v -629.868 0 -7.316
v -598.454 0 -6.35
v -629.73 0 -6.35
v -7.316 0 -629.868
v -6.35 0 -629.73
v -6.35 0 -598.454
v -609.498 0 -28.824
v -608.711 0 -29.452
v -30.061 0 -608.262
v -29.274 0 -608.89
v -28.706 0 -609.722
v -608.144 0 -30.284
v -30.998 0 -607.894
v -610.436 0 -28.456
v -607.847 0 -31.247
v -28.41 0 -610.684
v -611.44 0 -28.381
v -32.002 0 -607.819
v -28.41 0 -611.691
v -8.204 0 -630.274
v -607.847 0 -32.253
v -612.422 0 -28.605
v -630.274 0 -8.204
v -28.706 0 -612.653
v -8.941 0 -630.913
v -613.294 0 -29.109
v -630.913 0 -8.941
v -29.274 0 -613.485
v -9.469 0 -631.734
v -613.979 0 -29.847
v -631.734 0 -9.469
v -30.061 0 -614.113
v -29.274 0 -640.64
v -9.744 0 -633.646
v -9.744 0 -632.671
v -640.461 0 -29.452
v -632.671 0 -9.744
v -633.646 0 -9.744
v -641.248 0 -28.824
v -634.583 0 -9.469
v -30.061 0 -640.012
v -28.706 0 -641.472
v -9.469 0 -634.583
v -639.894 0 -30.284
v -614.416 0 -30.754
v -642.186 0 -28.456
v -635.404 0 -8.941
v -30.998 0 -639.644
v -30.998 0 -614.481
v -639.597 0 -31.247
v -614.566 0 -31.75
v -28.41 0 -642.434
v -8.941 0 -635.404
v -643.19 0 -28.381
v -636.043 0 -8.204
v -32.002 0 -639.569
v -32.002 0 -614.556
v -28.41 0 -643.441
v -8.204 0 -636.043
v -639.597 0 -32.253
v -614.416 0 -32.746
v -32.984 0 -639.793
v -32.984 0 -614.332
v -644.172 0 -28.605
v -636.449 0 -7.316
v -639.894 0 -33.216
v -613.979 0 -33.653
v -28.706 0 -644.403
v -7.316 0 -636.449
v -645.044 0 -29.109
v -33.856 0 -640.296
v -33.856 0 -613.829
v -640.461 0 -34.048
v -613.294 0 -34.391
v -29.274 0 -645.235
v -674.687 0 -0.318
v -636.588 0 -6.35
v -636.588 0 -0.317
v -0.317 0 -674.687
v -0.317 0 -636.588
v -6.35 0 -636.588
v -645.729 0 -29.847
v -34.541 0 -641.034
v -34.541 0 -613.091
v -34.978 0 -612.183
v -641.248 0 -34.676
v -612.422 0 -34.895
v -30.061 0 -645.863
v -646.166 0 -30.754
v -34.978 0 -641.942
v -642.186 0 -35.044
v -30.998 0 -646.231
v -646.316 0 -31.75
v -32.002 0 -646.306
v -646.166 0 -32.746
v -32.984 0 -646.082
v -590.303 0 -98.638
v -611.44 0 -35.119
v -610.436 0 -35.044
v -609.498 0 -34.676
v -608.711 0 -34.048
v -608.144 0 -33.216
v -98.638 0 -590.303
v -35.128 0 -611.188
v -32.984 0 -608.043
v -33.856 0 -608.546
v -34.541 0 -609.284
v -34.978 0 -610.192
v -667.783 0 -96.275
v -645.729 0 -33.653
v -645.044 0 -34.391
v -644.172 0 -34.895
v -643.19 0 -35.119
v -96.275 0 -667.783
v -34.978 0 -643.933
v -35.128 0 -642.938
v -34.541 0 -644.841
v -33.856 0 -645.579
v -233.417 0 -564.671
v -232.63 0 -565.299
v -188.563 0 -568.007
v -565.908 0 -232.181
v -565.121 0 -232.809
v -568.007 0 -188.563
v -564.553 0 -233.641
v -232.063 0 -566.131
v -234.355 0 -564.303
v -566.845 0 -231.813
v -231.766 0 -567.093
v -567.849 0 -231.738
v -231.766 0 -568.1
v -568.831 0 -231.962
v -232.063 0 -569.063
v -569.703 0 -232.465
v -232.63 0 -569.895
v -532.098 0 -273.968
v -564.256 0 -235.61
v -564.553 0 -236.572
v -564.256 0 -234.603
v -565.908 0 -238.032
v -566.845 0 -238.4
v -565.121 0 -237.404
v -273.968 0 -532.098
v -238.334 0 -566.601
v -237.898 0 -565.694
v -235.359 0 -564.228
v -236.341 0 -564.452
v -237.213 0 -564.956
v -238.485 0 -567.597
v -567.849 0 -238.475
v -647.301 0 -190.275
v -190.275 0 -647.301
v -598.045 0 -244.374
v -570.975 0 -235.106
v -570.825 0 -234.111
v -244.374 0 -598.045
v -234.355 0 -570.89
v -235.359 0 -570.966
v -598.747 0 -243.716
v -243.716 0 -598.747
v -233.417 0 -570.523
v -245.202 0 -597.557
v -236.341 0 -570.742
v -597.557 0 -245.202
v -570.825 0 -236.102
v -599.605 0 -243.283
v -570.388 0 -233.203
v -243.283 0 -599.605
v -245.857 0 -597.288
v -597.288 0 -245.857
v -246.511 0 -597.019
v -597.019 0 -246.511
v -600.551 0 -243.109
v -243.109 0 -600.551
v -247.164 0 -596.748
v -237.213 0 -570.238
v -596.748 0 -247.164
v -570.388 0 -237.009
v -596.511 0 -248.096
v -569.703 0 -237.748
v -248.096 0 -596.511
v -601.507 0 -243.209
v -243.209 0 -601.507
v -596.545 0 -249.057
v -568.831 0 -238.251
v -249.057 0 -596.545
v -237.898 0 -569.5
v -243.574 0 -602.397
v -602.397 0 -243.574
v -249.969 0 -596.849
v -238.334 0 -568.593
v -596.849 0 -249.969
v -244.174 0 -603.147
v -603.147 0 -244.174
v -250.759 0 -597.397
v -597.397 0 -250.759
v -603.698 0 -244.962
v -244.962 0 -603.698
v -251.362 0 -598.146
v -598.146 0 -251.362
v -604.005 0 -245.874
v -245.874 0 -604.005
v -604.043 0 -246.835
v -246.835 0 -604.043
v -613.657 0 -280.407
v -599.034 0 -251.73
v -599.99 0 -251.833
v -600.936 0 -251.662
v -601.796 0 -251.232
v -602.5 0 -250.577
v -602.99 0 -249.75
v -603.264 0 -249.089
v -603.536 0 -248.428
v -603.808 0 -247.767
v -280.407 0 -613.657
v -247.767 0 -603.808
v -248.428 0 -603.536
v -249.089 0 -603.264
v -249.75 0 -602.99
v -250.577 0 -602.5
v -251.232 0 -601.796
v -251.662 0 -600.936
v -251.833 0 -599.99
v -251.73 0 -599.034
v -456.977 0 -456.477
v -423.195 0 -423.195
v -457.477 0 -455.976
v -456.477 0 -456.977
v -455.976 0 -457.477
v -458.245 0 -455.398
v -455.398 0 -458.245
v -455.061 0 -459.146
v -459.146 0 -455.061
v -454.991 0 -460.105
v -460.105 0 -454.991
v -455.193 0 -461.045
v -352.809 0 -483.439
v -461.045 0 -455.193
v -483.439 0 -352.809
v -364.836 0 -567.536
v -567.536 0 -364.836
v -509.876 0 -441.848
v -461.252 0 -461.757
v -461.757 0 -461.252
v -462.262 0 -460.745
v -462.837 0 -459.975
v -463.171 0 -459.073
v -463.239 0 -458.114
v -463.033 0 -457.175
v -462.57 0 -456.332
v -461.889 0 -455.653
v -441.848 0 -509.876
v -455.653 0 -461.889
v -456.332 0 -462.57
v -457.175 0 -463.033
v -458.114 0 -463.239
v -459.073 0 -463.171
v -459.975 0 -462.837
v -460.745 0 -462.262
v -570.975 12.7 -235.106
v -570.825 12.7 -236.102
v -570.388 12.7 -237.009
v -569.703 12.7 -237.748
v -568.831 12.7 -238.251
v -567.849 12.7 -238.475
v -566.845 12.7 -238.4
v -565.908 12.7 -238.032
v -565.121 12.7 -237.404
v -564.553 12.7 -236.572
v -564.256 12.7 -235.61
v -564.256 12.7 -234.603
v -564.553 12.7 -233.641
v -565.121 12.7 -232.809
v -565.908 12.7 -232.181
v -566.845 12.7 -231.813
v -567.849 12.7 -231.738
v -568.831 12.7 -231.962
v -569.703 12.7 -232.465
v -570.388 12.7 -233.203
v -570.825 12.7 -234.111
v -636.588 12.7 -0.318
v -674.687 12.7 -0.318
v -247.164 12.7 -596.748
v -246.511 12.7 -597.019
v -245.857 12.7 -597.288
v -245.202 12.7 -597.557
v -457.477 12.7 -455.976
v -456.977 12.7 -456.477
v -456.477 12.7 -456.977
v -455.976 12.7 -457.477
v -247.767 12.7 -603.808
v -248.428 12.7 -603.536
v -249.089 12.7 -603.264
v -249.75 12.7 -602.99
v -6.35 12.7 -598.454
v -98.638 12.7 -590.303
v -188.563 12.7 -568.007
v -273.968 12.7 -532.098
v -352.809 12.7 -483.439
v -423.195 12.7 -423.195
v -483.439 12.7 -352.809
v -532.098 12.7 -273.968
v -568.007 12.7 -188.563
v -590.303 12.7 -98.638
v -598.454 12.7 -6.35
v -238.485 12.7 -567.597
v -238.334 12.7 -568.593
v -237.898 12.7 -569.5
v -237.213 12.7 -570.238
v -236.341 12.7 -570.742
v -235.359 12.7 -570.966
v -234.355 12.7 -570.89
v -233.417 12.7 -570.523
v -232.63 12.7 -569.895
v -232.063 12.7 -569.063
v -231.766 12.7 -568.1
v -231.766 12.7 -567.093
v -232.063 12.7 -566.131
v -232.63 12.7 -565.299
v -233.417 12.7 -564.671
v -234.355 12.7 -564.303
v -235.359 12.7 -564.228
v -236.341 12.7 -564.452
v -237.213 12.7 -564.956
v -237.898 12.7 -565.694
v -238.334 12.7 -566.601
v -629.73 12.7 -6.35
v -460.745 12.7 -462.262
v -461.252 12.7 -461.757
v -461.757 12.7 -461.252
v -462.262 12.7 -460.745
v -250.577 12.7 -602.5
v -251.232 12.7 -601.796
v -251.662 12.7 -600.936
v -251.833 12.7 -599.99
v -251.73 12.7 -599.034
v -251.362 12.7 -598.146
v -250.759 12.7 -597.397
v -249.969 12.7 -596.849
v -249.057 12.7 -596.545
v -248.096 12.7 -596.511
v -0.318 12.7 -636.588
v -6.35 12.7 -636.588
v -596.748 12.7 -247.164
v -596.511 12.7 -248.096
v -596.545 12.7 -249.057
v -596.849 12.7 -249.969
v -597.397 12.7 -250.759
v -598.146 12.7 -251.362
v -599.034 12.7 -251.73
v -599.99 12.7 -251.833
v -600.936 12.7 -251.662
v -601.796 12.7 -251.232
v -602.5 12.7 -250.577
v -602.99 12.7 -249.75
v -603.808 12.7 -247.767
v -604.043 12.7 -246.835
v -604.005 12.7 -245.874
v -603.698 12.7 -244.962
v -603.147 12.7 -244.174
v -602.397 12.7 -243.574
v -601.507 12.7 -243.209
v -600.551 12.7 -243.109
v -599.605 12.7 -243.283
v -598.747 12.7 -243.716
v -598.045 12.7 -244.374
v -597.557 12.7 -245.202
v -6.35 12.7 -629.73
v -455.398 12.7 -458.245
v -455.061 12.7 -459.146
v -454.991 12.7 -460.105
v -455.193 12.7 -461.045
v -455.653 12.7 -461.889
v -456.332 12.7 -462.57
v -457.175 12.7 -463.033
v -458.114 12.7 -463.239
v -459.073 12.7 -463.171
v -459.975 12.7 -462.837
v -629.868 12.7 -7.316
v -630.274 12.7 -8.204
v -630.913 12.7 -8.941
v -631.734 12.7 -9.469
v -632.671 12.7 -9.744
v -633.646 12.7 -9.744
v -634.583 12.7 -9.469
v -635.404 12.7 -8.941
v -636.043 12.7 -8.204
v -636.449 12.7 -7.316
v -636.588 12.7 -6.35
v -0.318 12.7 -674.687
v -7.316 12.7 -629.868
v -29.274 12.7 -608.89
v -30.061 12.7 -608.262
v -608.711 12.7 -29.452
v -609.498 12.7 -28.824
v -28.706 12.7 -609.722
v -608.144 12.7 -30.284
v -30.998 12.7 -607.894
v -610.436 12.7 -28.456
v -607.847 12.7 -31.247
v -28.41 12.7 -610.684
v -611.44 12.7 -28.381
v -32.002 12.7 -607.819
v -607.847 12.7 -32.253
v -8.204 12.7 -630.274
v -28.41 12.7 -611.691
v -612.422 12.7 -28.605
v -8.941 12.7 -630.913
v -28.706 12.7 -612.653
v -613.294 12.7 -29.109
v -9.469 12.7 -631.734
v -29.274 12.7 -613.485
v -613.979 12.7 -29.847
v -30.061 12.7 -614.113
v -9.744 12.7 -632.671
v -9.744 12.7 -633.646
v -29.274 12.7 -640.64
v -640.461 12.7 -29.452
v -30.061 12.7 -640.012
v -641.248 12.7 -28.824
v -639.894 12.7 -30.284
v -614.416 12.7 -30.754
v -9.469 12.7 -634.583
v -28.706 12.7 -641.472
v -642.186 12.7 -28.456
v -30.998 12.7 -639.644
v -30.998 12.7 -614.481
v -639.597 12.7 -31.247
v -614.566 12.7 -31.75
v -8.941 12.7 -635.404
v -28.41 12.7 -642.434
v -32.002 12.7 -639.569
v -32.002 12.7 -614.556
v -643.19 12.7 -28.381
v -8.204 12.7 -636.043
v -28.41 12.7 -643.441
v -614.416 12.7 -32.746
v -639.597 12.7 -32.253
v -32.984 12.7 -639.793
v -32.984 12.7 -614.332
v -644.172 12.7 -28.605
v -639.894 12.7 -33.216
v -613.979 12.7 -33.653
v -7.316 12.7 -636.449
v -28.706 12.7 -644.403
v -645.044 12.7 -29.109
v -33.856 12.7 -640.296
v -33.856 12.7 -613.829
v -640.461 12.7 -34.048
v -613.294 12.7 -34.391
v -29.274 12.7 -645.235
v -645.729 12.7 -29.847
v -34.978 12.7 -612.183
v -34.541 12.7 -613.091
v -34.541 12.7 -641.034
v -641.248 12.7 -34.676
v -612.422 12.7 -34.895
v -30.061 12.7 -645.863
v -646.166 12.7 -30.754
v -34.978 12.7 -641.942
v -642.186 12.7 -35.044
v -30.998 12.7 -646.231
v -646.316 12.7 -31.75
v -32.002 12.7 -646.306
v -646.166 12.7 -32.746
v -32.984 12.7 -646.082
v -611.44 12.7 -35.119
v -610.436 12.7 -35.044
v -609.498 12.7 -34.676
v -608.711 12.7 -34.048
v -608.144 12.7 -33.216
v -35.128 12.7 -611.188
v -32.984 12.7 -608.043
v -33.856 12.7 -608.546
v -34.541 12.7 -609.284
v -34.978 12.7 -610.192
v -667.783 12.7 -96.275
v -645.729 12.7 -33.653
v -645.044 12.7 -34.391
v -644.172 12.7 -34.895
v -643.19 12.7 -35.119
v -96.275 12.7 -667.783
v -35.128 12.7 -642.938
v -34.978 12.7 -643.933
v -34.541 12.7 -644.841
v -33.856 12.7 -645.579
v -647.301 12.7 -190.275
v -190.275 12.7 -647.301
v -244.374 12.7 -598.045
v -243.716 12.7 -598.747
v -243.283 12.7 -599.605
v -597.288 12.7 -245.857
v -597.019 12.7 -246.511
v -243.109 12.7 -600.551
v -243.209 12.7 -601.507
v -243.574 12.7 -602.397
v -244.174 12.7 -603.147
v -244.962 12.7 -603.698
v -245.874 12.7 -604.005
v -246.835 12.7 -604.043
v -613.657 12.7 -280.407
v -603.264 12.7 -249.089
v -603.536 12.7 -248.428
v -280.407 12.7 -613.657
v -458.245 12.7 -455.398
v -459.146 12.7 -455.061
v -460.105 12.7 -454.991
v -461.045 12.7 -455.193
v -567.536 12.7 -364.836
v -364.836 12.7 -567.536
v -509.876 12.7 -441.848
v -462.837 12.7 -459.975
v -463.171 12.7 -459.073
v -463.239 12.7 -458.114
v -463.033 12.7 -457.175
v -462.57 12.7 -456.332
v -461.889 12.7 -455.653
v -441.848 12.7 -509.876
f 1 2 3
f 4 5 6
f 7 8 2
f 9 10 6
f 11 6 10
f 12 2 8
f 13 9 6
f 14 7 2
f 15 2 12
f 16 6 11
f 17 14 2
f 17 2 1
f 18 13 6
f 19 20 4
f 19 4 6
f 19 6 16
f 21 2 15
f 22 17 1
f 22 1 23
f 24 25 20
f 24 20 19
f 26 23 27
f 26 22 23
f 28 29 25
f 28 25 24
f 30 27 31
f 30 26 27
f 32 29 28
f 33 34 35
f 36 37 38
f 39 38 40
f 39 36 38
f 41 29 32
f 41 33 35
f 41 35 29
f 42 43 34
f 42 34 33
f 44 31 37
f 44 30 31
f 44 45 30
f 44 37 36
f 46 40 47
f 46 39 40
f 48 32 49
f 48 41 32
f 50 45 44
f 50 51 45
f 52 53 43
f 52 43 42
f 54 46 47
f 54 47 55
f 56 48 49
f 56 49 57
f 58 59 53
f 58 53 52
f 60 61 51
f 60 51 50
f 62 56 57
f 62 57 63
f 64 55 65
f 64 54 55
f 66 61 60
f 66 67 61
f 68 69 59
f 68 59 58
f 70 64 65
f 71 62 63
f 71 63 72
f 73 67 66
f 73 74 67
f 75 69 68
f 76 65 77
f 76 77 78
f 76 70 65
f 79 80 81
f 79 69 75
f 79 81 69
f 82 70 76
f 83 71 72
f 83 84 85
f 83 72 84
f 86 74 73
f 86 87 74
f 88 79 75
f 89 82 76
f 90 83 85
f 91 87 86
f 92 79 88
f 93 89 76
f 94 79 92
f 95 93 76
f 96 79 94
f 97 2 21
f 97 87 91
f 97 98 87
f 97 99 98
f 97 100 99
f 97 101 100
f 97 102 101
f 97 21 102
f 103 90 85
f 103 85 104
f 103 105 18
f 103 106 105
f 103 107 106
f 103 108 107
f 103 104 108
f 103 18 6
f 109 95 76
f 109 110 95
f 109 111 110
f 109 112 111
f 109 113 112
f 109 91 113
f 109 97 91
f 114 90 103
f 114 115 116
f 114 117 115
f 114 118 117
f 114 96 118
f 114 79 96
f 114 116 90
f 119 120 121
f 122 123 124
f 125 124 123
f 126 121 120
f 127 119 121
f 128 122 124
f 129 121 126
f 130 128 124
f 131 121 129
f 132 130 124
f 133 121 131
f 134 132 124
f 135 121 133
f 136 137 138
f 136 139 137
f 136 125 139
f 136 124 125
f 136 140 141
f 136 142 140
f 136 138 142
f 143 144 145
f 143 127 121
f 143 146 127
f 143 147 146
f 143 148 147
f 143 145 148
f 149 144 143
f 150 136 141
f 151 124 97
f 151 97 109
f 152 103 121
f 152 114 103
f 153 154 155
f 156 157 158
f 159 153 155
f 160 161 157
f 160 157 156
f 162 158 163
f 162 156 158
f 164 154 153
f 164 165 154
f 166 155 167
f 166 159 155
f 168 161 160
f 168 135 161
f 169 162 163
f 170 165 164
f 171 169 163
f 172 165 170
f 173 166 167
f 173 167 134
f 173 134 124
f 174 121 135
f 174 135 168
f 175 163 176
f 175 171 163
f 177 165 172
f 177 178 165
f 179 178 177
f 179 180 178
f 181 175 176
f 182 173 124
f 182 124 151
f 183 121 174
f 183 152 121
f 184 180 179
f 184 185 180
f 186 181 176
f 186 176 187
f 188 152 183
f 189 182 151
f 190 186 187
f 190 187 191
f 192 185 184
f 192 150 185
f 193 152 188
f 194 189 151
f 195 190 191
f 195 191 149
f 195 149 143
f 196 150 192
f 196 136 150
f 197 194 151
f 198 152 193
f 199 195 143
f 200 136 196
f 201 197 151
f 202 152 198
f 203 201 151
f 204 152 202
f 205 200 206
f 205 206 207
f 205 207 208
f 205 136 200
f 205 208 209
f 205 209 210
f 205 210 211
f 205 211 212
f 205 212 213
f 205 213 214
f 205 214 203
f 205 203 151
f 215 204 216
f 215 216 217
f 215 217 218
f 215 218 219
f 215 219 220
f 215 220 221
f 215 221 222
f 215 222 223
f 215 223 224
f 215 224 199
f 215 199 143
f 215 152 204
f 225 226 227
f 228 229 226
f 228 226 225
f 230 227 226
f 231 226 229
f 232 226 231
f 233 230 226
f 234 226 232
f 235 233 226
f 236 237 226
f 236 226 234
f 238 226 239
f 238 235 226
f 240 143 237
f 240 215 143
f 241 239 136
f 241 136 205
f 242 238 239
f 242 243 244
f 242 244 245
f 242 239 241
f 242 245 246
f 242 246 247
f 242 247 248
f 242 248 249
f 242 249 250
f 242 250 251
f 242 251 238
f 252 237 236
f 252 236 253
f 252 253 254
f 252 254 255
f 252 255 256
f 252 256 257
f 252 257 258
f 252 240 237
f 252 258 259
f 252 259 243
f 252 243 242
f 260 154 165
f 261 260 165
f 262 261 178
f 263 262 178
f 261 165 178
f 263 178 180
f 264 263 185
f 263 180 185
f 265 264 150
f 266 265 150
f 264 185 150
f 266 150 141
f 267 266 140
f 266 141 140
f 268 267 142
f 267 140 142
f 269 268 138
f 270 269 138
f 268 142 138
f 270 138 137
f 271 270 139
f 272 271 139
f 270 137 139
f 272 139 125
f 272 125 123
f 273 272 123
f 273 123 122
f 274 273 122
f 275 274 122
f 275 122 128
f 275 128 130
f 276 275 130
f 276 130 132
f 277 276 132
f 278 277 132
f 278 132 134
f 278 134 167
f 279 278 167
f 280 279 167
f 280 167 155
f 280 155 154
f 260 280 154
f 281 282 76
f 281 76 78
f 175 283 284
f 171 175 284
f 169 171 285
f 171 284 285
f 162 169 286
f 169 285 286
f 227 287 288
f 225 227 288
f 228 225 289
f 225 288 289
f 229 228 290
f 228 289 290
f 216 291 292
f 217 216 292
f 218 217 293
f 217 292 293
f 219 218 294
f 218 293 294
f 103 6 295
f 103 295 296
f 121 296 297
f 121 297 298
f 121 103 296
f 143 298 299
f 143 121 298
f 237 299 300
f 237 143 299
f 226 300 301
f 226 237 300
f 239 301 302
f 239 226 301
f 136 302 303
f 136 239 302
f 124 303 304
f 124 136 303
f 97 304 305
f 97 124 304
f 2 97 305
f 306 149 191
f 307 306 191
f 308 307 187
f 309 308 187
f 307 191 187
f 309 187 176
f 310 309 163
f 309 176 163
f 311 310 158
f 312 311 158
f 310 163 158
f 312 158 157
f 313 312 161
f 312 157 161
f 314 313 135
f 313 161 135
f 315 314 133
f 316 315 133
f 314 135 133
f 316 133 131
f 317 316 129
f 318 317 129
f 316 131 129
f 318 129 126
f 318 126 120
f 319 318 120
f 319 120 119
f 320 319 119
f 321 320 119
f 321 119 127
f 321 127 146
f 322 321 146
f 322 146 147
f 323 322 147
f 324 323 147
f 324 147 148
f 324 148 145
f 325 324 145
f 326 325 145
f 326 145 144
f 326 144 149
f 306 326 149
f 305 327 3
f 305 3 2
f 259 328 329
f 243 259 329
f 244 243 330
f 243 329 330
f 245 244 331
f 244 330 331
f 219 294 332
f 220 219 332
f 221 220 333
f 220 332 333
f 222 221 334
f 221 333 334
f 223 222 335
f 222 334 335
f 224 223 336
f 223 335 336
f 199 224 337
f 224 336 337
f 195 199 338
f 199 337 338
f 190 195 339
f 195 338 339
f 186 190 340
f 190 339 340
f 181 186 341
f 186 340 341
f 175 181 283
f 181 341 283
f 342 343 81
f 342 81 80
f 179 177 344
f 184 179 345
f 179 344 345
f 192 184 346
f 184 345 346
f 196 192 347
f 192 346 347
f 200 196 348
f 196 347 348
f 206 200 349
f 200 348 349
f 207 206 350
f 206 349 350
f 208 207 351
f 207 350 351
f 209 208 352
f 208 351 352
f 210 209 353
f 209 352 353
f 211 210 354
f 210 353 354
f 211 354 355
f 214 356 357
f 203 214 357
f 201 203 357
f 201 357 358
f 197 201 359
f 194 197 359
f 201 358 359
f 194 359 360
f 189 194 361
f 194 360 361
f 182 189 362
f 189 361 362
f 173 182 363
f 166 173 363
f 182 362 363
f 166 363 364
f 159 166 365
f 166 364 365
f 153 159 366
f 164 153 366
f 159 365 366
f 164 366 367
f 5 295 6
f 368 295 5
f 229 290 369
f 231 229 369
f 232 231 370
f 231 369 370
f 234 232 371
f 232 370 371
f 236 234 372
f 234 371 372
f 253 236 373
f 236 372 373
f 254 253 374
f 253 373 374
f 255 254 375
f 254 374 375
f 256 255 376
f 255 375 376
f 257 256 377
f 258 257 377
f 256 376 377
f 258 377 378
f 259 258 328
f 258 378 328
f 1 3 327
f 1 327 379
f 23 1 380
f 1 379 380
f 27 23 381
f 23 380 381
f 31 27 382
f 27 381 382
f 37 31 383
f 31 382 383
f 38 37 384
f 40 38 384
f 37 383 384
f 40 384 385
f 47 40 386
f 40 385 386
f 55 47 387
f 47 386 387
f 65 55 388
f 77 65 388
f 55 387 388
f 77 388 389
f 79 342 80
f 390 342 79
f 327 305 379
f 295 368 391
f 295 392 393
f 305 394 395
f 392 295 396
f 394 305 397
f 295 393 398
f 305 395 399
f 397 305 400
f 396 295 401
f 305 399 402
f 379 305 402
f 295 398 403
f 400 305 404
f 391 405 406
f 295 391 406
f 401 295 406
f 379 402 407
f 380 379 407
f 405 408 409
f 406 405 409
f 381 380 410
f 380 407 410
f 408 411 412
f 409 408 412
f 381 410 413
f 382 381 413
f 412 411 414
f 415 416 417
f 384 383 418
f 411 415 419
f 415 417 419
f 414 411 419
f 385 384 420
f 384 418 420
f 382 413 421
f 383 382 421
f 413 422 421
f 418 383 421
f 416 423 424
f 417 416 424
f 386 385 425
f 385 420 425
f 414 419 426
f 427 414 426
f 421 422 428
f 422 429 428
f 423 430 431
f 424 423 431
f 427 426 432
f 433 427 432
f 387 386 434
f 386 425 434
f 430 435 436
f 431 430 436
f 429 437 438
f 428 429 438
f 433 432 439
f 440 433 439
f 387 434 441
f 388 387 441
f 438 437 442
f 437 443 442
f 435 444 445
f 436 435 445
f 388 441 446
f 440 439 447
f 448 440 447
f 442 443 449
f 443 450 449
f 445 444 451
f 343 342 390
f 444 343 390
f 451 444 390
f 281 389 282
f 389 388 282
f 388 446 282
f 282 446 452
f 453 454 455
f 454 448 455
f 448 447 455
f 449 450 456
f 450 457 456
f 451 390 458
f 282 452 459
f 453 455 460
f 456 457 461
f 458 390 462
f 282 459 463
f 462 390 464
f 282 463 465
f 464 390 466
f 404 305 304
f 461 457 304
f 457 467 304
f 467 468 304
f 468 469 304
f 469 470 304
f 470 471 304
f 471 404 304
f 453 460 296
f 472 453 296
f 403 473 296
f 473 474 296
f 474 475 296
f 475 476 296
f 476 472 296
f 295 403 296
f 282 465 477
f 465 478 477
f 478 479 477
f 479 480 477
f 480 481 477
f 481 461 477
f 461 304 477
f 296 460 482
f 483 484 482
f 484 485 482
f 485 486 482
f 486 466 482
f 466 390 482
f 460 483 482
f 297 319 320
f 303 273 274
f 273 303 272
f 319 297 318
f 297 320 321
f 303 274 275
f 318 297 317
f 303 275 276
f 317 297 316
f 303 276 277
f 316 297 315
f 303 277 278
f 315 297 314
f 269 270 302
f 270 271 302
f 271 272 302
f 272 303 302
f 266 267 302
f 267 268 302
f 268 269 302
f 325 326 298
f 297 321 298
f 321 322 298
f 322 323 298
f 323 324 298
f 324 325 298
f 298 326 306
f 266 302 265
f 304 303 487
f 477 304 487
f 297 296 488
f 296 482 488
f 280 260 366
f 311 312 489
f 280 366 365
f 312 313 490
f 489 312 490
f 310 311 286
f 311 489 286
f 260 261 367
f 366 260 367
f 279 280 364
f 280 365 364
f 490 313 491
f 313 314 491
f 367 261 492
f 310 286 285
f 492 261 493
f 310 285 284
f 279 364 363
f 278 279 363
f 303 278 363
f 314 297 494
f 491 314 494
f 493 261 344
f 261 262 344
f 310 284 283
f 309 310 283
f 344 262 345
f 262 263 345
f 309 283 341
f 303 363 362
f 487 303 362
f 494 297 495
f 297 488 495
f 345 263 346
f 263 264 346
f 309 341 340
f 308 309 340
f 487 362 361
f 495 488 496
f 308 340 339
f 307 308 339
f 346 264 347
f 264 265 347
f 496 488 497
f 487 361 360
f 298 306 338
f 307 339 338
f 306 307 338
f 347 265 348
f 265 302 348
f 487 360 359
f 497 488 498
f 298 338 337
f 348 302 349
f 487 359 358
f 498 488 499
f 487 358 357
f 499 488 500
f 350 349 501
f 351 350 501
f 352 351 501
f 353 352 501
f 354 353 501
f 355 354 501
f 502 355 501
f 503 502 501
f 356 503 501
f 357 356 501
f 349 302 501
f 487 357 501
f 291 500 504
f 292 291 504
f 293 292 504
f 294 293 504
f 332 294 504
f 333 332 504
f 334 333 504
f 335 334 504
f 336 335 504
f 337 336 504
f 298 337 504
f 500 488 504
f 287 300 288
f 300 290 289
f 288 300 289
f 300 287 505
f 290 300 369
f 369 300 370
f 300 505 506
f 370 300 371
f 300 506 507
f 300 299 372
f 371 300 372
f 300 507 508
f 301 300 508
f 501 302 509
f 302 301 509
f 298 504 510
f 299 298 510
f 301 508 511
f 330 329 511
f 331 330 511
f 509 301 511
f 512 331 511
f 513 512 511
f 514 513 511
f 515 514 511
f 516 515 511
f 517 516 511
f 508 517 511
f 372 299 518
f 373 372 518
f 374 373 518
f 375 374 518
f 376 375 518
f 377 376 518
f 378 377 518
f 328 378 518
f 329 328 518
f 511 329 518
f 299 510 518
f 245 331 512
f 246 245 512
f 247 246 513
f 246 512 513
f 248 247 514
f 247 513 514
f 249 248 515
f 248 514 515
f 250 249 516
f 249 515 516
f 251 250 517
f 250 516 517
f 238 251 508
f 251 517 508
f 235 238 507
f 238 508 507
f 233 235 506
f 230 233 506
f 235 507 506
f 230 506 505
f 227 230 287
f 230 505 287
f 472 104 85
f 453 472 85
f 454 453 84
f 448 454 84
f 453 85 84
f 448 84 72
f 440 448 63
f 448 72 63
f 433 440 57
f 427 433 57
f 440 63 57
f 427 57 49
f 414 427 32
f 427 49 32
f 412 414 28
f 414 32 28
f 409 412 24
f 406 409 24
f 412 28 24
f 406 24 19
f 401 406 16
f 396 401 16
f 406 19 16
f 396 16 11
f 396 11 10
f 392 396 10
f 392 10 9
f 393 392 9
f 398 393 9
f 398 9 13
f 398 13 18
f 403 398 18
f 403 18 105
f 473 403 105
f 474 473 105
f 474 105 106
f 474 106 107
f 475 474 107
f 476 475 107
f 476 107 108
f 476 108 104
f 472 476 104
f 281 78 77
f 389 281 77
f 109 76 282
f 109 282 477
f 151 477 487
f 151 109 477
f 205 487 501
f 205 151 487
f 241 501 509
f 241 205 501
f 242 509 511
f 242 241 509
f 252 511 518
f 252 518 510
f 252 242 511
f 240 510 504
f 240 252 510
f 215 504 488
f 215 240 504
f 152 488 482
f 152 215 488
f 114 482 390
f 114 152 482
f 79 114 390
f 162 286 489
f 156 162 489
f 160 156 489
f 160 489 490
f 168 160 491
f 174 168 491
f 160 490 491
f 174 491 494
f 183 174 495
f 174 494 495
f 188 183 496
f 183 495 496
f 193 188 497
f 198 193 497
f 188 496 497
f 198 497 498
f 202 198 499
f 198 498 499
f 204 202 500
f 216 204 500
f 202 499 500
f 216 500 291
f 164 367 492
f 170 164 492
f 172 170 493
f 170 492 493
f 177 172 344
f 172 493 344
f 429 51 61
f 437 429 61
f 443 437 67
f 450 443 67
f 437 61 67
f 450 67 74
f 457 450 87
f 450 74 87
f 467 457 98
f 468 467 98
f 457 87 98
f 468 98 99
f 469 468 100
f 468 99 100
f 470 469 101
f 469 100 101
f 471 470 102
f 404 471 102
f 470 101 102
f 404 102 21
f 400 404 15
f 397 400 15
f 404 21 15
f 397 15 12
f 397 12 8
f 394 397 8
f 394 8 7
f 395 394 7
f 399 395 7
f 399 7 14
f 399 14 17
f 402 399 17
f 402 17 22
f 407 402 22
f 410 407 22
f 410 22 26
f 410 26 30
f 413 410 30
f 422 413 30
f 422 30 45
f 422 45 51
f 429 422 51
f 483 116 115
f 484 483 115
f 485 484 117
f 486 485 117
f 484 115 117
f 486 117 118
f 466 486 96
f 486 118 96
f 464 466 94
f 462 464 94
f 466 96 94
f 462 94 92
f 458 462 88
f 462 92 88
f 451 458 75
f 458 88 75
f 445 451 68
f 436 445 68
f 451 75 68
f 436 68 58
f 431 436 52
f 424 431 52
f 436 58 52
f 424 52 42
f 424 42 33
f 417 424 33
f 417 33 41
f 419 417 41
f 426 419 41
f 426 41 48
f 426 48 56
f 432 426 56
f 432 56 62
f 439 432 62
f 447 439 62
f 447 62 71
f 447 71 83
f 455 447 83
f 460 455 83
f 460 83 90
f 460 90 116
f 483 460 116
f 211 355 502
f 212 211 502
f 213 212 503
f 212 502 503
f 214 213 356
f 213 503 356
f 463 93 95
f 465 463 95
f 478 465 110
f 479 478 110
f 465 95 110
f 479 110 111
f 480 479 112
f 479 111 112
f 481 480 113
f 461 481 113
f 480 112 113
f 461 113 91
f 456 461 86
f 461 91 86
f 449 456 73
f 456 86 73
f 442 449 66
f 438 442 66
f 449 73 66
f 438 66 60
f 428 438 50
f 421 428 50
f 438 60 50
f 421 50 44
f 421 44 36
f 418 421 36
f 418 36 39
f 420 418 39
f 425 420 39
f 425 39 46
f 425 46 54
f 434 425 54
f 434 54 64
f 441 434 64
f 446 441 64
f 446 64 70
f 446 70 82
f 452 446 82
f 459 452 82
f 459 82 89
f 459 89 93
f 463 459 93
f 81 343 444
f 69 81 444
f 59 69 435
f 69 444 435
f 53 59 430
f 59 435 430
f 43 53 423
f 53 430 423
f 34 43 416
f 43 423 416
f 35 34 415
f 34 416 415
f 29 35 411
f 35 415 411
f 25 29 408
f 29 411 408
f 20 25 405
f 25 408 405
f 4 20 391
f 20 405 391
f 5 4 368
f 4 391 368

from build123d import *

# Parameters (mm, degrees)
BOSS_EXTRUDE1_DEPTH     = 12.7
SKETCH2_W               = 12.7
SKETCH2_H               = 38.133687951
SKETCH2_W_2             = 38.133687951
SKETCH2_H_2             = 12.7
CUT_EXTRUDE1_DEPTH      = 13.7
SKETCH3_R               = 3.429
CUT_EXTRUDE2_DEPTH      = 13.7
F_1_4_CLEARANCE_HOLE2_D = 6.7564
SKETCH8_W               = 674.6875
SKETCH8_H               = 674.6875
CUT_EXTRUDE4_DEPTH      = 13.7
SKETCH10_W              = 0.3175
SKETCH10_H              = 38.1
SKETCH10_W_2            = 38.1
SKETCH10_H_2            = 0.3175
CUT_EXTRUDE5_DEPTH      = 13.7
CUT_EXTRUDE6_DEPTH      = 13.7


with BuildPart() as part:
    # Sketch1 → Boss-Extrude1 (new body)
    with BuildSketch(Plane(origin=(0, 0, 0), x_dir=(1, 0, 0), z_dir=(0, 1, 0))):
        with BuildLine():
            Line((-598.4875, 0), (-674.6875, 0))
            ThreePointArc((-674.6875, 0), (0, 674.6875), (674.6875, 0))
            Line((674.6875, 0), (598.4875, 0))
            ThreePointArc((598.4875, 0), (0, 598.4875), (-598.4875, 0))
        make_face()
    extrude(amount=BOSS_EXTRUDE1_DEPTH)

    # Sketch2 → Cut-Extrude1 (cut, through all)
    with BuildSketch(Plane(origin=(0, 12.7, 0), x_dir=(1, 0, 0), z_dir=(0, 1, 0))):
        with Locations((0, 617.520656025)):
            Rectangle(SKETCH2_W, SKETCH2_H)
        with Locations((617.520656025, 0)):
            Rectangle(SKETCH2_W_2, SKETCH2_H_2)
        with Locations((0, -617.520656025)):
            Rectangle(SKETCH2_W, SKETCH2_H)
        with Locations((-617.520656025, 0)):
            Rectangle(SKETCH2_W_2, SKETCH2_H_2)
    extrude(amount=-CUT_EXTRUDE1_DEPTH, mode=Mode.SUBTRACT)

    # Sketch3 → Cut-Extrude2 (cut, through all)
    with BuildSketch(Plane(origin=(0, 12.7, 0), x_dir=(1, 0, 0), z_dir=(0, 1, 0))):
        with Locations((-6.35, 633.1585)):
            Circle(SKETCH3_R)
        with Locations((-633.1585, 6.35)):
            Circle(SKETCH3_R)
        with Locations((6.35, 633.1585)):
            Circle(SKETCH3_R)
        with Locations((633.1585, 6.35)):
            Circle(SKETCH3_R)
    extrude(amount=-CUT_EXTRUDE2_DEPTH, mode=Mode.SUBTRACT)

    # 1/4 Clearance Hole2 (through all)
    with Locations(Plane(origin=(0, 12.7, 0), x_dir=(1, 0, 0), z_dir=(0, 1, 0))):
        with Locations((-31.75, 642.9375), (-31.75, 611.1875), (-611.1875, 31.75), (-642.9375, 31.75), (-567.596939292, 235.106350216), (-235.106350216, 567.596939292)):
            Hole(F_1_4_CLEARANCE_HOLE2_D / 2)

    # Sketch8 → Cut-Extrude4 (cut, through all)
    with BuildSketch(Plane(origin=(0, 12.7, 0), x_dir=(1, 0, 0), z_dir=(0, 1, 0))):
        with Locations((337.34375, 337.34375)):
            Rectangle(SKETCH8_W, SKETCH8_H)
    extrude(amount=-CUT_EXTRUDE4_DEPTH, mode=Mode.SUBTRACT)

    # Sketch10 → Cut-Extrude5 (cut, through all)
    with BuildSketch(Plane(origin=(0, 12.7, 0), x_dir=(1, 0, 0), z_dir=(0, 1, 0))):
        with Locations((-0.15875, 655.6375)):
            Rectangle(SKETCH10_W, SKETCH10_H)
        with Locations((-655.6375, 0.15875)):
            Rectangle(SKETCH10_W_2, SKETCH10_H_2)
    extrude(amount=-CUT_EXTRUDE5_DEPTH, mode=Mode.SUBTRACT)

    # Sketch13 → Cut-Extrude6 (cut, through all)
    with BuildSketch(Plane(origin=(0, 12.7, 0), x_dir=(1, 0, 0), z_dir=(0, 1, 0))):
        with BuildLine():
            ThreePointArc((-602.990490798, 249.74984277), (-603.400029696, 248.75875888), (-603.807939635, 247.767003434))
            ThreePointArc((-603.807939635, 247.767003434), (-601.965070474, 243.359248479), (-597.55731552, 245.20211764))
            ThreePointArc((-597.55731552, 245.20211764), (-597.153628267, 246.183606427), (-596.748328919, 247.164430609))
            ThreePointArc((-596.748328919, 247.164430609), (-598.576703778, 251.578217629), (-602.990490798, 249.74984277))
        make_face()
        with BuildLine():
            ThreePointArc((-460.745442177, 462.261996567), (-461.504342318, 461.504342318), (-462.261996567, 460.745442177))
            ThreePointArc((-462.261996567, 460.745442177), (-462.254146876, 455.967952369), (-457.476657068, 455.97580206))
            ThreePointArc((-457.476657068, 455.97580206), (-456.726846061, 456.726846061), (-455.97580206, 457.476657068))
            ThreePointArc((-455.97580206, 457.476657068), (-455.967952369, 462.254146876), (-460.745442177, 462.261996567))
        make_face()
        with BuildLine():
            ThreePointArc((-247.767003434, 603.807939635), (-248.75875888, 603.400029696), (-249.74984277, 602.990490798))
            ThreePointArc((-249.74984277, 602.990490798), (-251.578217629, 598.576703778), (-247.164430609, 596.748328919))
            ThreePointArc((-247.164430609, 596.748328919), (-246.183606427, 597.153628267), (-245.20211764, 597.55731552))
            ThreePointArc((-245.20211764, 597.55731552), (-243.359248479, 601.965070474), (-247.767003434, 603.807939635))
        make_face()
    extrude(amount=-CUT_EXTRUDE6_DEPTH, mode=Mode.SUBTRACT)


solid = part.part
